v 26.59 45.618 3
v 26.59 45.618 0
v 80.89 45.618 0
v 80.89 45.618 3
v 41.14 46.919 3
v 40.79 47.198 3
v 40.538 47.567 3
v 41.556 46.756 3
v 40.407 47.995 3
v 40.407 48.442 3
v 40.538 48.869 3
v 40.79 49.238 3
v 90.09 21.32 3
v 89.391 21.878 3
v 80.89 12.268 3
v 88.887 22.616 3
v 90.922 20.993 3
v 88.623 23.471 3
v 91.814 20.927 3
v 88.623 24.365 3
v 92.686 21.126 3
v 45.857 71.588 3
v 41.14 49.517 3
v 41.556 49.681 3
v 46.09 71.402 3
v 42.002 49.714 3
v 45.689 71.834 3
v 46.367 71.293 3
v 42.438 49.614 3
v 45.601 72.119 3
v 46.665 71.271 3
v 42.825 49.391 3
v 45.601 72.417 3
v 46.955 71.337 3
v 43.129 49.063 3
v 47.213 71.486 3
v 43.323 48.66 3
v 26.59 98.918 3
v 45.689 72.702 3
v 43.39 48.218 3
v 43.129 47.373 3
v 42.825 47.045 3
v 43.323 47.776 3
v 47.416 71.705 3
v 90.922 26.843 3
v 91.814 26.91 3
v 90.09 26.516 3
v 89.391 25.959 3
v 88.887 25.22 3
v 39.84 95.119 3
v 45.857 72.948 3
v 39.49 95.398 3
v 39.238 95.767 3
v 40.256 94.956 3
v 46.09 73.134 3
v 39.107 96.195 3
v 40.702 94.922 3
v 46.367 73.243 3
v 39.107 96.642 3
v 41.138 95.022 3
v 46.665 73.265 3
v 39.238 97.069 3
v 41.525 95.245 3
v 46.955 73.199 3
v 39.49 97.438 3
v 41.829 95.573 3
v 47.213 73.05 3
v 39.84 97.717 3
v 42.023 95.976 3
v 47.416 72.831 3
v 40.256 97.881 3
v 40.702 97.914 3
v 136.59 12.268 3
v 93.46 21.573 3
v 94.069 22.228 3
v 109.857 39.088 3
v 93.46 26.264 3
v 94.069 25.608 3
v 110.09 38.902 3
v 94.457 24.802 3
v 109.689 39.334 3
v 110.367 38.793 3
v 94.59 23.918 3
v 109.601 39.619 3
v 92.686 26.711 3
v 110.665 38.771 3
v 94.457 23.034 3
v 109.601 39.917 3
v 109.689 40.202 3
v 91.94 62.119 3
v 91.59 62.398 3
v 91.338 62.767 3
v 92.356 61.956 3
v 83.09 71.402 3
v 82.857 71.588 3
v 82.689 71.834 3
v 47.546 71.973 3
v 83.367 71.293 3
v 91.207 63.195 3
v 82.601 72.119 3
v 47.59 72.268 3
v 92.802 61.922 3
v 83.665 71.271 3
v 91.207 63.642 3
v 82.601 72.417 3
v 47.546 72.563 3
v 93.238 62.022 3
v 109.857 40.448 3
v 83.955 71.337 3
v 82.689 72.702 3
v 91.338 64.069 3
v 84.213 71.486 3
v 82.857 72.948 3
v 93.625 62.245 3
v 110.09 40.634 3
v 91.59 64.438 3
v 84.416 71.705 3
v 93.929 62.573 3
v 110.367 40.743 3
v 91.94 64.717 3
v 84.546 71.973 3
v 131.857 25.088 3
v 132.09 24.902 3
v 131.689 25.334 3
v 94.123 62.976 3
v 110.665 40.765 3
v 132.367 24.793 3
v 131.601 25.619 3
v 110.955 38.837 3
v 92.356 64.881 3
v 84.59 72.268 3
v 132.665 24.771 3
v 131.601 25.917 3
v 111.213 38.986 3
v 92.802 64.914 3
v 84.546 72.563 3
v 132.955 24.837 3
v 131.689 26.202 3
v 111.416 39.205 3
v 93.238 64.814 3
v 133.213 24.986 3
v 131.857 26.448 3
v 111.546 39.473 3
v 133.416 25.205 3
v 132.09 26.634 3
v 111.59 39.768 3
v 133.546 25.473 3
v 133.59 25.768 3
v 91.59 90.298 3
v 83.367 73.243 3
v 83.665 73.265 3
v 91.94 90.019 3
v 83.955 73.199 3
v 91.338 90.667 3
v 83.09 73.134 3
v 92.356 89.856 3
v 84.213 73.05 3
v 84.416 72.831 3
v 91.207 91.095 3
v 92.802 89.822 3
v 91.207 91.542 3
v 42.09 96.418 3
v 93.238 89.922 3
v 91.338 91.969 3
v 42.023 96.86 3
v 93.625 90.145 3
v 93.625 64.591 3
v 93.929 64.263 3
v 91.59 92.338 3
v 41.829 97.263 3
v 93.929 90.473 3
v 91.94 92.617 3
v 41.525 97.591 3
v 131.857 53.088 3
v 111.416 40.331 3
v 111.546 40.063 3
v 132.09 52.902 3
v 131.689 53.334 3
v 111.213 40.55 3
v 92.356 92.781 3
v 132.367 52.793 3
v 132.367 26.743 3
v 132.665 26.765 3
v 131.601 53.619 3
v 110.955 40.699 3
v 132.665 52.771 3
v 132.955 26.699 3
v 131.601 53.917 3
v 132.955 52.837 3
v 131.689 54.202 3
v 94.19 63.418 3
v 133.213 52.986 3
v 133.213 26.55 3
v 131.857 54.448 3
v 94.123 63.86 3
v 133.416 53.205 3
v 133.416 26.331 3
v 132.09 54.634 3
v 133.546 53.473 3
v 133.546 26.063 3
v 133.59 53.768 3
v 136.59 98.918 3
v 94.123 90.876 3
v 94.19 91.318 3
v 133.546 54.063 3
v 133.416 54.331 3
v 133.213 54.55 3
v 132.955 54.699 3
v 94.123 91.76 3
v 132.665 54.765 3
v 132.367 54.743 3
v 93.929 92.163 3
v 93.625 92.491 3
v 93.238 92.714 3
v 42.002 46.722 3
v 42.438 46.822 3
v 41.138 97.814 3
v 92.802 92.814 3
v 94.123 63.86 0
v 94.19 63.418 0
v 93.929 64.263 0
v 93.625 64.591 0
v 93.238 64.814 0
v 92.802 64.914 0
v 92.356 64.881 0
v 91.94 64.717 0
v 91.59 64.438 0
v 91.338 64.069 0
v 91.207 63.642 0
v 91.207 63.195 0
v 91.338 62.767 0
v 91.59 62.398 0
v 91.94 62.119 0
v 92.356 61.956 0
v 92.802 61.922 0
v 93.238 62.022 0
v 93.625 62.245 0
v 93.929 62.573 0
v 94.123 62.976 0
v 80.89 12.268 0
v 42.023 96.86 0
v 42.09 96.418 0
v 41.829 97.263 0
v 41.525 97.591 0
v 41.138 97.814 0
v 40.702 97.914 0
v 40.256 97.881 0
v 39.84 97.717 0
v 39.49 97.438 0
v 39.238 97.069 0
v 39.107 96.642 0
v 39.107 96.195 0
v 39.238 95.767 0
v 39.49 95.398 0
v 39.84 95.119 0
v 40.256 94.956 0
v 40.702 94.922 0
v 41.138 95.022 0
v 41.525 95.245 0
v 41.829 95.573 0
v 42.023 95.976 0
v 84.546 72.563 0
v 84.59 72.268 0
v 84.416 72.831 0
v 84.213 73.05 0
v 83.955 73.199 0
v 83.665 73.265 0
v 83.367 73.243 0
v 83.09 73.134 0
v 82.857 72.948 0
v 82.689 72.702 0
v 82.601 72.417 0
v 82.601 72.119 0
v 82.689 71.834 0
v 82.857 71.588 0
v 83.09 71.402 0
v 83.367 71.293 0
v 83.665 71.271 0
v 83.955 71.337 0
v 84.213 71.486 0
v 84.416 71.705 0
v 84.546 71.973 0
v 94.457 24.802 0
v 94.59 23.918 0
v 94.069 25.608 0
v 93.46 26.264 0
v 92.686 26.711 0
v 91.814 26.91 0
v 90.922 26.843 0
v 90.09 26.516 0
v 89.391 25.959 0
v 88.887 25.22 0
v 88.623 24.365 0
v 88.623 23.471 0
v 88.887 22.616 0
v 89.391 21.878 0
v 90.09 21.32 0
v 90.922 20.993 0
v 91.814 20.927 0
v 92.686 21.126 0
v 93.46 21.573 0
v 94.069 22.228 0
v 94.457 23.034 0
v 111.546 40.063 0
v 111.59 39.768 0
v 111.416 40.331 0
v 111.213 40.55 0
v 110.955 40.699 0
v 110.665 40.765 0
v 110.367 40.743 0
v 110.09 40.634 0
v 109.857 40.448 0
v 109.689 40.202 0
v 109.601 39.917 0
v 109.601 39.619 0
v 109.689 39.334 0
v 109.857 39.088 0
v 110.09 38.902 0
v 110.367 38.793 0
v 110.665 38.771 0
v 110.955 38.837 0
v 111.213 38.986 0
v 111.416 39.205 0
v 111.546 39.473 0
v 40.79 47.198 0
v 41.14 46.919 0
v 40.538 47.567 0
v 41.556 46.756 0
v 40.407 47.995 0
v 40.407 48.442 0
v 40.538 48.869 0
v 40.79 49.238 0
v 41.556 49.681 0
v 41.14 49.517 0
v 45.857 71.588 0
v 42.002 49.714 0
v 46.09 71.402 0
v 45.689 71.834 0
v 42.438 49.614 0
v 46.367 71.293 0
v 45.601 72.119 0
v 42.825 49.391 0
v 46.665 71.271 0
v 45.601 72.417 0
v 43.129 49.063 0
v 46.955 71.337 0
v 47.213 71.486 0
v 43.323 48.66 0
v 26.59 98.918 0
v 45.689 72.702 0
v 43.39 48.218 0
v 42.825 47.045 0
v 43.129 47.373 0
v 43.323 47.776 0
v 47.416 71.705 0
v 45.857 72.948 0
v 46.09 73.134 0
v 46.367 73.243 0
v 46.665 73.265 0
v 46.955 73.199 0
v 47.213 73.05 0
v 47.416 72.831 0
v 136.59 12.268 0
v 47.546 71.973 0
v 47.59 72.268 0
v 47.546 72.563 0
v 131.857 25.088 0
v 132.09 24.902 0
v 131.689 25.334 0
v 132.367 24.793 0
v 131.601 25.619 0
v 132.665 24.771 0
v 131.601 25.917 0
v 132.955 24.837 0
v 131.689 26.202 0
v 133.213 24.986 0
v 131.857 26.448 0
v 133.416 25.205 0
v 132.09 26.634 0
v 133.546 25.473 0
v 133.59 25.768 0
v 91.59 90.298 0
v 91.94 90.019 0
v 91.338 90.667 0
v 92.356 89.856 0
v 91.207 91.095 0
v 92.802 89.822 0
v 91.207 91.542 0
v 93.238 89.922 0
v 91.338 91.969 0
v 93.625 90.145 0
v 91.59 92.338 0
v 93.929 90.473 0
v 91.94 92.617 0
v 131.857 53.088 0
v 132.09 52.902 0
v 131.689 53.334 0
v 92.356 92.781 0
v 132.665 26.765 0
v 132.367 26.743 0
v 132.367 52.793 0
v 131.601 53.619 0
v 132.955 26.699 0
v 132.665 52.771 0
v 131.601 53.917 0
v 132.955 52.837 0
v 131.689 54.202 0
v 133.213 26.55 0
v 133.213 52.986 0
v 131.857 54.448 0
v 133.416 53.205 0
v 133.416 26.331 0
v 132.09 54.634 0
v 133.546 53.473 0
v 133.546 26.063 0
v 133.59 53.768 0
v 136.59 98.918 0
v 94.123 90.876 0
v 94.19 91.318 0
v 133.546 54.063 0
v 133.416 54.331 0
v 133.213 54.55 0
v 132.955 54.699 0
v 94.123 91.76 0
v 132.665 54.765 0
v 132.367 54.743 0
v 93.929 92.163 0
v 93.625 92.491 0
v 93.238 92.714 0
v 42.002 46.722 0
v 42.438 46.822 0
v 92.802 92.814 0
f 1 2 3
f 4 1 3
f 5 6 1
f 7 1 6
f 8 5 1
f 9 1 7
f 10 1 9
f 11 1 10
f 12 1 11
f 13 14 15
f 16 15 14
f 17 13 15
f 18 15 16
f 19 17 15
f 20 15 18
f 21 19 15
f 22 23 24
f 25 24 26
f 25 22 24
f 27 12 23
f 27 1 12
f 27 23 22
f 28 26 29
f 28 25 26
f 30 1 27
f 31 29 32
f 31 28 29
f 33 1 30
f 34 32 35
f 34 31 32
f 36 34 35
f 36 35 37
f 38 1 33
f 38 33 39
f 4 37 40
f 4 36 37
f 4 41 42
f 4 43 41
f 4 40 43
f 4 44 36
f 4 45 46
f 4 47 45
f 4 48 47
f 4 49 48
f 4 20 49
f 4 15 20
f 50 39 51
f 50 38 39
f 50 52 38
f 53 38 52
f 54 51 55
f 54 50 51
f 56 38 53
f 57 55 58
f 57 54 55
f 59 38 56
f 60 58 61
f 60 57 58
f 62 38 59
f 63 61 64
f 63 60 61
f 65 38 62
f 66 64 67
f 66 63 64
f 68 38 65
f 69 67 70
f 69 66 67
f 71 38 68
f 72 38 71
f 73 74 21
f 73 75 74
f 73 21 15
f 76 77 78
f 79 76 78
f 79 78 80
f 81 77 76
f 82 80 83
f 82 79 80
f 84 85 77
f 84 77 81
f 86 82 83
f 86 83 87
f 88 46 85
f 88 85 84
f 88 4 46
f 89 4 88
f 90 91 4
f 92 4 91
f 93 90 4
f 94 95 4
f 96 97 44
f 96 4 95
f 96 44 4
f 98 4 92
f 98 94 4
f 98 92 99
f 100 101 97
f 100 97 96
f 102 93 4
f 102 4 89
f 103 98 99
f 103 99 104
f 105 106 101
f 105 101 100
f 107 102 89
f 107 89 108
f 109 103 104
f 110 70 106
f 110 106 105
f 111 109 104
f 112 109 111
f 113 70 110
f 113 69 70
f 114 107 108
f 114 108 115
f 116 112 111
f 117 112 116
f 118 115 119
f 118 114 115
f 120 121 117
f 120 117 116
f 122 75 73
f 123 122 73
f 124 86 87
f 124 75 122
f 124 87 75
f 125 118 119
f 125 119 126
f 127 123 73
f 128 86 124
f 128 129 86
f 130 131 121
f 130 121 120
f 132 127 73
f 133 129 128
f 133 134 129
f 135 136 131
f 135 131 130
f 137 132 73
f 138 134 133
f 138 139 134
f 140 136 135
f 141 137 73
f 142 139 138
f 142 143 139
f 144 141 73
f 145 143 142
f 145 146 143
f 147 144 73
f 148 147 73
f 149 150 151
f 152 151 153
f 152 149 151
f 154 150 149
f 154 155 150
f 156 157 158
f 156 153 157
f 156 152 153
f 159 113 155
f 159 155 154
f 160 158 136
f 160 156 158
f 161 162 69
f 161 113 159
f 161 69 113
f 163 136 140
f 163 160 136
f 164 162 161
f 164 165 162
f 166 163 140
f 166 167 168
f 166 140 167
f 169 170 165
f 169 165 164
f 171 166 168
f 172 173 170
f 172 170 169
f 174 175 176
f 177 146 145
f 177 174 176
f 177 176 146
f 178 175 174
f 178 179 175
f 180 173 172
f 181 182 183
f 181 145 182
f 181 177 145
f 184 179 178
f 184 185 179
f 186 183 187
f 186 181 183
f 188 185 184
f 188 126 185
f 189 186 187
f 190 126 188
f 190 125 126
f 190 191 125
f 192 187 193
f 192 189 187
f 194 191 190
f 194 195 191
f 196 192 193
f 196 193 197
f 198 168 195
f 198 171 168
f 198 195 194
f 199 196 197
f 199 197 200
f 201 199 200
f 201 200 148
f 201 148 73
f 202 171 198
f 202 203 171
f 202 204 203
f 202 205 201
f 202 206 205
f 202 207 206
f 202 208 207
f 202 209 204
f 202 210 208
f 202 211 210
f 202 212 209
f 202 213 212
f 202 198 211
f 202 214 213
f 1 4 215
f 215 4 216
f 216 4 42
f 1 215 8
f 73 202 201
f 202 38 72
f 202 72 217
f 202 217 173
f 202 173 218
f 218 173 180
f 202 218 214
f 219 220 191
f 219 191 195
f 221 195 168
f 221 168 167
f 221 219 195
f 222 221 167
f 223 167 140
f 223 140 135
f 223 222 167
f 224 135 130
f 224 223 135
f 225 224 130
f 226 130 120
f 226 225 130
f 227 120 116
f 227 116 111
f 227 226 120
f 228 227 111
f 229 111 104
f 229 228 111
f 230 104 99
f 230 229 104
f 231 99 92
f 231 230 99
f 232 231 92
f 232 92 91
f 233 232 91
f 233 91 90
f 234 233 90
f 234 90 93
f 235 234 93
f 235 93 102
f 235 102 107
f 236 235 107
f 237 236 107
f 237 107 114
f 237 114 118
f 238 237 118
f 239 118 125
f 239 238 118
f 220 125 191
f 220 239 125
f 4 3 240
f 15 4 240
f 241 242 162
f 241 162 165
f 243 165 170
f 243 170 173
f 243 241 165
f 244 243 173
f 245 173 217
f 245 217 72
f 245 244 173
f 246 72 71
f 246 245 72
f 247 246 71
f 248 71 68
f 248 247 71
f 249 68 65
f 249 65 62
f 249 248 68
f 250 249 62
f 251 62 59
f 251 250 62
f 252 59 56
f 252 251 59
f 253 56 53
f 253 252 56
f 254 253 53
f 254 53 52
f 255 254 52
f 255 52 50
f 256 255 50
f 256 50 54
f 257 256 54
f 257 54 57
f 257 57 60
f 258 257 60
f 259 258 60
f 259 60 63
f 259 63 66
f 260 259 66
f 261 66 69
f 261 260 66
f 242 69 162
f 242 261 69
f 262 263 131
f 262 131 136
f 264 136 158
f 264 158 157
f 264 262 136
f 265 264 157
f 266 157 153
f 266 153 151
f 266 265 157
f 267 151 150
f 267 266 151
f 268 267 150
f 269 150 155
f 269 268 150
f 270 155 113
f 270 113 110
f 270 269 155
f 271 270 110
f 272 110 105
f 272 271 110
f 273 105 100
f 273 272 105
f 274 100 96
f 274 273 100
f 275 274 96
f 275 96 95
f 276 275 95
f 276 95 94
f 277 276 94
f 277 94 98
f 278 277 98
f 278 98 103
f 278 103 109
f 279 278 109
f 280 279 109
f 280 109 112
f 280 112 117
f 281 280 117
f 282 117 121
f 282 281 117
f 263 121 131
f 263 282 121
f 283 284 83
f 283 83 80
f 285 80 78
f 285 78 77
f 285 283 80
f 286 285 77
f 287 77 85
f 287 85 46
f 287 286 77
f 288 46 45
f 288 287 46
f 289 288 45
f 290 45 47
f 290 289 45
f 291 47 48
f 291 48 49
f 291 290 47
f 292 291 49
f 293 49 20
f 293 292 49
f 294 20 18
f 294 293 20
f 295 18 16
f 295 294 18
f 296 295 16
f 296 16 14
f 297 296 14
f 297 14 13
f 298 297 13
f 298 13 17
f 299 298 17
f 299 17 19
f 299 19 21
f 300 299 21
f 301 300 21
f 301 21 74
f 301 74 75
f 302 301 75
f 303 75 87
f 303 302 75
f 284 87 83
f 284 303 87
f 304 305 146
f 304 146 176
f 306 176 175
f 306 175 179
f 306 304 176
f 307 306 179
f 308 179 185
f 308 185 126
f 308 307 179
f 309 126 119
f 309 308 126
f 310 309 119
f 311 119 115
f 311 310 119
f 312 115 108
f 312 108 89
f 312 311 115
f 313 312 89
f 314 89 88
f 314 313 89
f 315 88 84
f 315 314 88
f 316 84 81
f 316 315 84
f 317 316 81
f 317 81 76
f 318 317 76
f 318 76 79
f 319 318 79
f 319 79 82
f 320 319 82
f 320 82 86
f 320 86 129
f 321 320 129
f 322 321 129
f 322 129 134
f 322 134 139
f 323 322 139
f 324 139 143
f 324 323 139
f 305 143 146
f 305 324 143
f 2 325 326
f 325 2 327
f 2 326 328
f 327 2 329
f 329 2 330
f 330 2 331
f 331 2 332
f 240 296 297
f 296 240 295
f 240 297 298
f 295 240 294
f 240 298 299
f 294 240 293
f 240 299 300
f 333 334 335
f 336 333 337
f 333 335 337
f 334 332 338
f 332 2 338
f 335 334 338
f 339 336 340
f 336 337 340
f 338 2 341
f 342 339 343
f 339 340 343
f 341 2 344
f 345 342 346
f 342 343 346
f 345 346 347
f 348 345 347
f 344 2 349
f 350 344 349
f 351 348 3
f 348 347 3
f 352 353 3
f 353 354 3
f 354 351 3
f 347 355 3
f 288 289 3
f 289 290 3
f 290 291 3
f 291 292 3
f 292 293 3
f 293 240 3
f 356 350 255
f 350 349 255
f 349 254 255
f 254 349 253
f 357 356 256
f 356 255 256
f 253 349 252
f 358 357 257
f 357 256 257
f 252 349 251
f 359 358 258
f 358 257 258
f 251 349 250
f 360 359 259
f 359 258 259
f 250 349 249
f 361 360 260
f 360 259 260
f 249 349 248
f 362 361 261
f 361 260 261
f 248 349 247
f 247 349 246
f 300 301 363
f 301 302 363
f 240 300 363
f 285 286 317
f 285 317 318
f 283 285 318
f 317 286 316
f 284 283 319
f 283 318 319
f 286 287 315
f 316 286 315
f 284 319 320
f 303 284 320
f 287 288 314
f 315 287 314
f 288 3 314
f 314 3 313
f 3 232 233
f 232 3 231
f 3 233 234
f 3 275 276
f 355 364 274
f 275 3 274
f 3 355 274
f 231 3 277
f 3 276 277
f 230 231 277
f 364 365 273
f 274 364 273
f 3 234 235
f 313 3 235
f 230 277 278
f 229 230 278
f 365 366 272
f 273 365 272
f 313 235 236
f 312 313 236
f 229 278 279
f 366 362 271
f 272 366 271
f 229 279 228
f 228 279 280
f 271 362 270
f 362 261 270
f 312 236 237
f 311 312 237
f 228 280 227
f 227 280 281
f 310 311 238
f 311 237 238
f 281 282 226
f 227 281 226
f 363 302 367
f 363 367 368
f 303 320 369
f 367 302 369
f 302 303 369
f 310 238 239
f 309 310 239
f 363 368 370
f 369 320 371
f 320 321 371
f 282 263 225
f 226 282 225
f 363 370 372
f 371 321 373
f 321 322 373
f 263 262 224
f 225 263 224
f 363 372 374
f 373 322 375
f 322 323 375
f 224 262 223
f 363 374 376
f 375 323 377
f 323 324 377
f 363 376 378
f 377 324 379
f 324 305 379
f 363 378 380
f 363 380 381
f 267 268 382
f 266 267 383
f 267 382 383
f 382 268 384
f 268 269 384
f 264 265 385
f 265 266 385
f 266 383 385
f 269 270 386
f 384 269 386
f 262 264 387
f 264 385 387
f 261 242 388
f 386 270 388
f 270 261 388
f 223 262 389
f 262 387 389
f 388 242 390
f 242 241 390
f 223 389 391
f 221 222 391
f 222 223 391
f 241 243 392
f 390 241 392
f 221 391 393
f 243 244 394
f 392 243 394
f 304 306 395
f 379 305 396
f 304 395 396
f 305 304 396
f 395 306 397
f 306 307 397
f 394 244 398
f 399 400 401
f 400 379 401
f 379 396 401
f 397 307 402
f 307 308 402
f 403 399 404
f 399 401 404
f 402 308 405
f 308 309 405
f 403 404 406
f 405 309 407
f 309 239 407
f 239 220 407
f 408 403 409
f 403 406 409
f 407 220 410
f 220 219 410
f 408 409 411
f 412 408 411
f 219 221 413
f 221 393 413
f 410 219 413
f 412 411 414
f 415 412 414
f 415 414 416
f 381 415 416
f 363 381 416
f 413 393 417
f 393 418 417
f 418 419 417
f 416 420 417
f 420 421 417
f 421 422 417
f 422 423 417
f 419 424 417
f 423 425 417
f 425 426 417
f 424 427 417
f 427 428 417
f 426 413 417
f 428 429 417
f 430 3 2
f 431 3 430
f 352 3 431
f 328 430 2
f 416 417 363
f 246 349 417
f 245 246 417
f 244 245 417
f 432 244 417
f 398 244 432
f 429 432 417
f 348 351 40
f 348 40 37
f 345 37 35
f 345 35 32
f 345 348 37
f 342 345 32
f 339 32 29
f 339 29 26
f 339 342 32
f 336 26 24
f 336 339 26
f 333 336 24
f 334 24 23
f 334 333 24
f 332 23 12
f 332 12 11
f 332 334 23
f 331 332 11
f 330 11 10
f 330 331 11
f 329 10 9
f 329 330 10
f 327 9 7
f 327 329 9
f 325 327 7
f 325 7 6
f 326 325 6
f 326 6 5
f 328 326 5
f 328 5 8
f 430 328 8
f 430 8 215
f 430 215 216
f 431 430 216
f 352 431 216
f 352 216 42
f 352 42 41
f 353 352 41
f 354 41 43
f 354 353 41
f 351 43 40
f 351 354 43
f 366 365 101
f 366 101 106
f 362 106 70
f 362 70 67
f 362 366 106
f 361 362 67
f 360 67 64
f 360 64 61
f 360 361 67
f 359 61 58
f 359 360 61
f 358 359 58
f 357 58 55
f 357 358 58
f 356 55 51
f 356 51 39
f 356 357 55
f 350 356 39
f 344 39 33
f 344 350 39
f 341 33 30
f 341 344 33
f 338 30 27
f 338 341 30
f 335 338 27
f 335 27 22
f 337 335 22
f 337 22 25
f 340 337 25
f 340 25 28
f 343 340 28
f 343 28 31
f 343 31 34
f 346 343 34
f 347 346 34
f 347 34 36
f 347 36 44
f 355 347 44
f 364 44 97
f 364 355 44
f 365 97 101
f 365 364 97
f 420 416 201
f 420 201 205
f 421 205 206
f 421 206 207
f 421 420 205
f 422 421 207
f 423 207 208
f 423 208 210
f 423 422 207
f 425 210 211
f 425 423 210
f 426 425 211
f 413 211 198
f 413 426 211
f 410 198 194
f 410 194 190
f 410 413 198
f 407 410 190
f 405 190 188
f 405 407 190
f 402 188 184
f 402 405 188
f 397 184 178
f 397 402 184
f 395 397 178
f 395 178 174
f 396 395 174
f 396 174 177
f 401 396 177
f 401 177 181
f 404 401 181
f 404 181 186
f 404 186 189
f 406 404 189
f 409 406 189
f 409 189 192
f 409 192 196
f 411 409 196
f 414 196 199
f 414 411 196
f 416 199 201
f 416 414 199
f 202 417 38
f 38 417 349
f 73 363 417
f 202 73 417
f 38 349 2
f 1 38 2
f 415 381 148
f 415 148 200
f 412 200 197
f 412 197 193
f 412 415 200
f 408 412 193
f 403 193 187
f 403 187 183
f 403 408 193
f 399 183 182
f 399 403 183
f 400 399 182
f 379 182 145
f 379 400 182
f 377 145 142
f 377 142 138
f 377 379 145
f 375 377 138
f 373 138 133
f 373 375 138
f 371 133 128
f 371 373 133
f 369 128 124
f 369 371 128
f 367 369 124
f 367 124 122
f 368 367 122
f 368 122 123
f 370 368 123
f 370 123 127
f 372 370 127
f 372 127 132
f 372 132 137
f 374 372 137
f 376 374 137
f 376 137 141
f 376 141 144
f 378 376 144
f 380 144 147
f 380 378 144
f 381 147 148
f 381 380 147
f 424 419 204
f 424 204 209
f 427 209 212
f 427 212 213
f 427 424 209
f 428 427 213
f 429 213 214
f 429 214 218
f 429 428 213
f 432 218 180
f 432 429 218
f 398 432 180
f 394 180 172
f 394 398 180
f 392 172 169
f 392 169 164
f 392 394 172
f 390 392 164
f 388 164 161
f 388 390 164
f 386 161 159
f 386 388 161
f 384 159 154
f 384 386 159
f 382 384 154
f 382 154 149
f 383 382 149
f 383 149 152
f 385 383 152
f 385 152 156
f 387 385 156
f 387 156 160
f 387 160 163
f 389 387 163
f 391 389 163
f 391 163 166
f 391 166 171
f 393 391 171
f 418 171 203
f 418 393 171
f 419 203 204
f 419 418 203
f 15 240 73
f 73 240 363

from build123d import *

# Parameters (mm, degrees)
MODEL_R             = 1.5
MODEL_R_2           = 1
MODEL_R_3           = 3
BOSS_EXTRUDE1_DEPTH = 3


with BuildPart() as part:
    # Model → Boss-Extrude1 (new body)
    with BuildSketch(Plane.XY):
        Polygon((26.589929576, 98.91813413), (26.589929576, 45.61813413), (80.889929576, 45.61813413), (80.889929576, 12.26813413), (136.589929576, 12.26813413), (136.589929576, 45.61813413), (136.589929576, 98.91813413), align=None)
        with Locations((40.589929576, 96.41813413)):
            Circle(MODEL_R, mode=Mode.SUBTRACT)
        with Locations((92.689929576, 63.41813413)):
            Circle(MODEL_R, mode=Mode.SUBTRACT)
        with Locations((41.889929576, 48.21813413)):
            Circle(MODEL_R, mode=Mode.SUBTRACT)
        with Locations((92.689929576, 91.31813413)):
            Circle(MODEL_R, mode=Mode.SUBTRACT)
        with Locations((110.589929576, 39.76813413)):
            Circle(MODEL_R_2, mode=Mode.SUBTRACT)
        with Locations((46.589929576, 72.26813413)):
            Circle(MODEL_R_2, mode=Mode.SUBTRACT)
        with Locations((83.589929576, 72.26813413)):
            Circle(MODEL_R_2, mode=Mode.SUBTRACT)
        with Locations((132.589929576, 25.76813413)):
            Circle(MODEL_R_2, mode=Mode.SUBTRACT)
        with Locations((91.589929576, 23.91813413)):
            Circle(MODEL_R_3, mode=Mode.SUBTRACT)
        with Locations((132.589929576, 53.76813413)):
            Circle(MODEL_R_2, mode=Mode.SUBTRACT)
    extrude(amount=BOSS_EXTRUDE1_DEPTH)


solid = part.part
